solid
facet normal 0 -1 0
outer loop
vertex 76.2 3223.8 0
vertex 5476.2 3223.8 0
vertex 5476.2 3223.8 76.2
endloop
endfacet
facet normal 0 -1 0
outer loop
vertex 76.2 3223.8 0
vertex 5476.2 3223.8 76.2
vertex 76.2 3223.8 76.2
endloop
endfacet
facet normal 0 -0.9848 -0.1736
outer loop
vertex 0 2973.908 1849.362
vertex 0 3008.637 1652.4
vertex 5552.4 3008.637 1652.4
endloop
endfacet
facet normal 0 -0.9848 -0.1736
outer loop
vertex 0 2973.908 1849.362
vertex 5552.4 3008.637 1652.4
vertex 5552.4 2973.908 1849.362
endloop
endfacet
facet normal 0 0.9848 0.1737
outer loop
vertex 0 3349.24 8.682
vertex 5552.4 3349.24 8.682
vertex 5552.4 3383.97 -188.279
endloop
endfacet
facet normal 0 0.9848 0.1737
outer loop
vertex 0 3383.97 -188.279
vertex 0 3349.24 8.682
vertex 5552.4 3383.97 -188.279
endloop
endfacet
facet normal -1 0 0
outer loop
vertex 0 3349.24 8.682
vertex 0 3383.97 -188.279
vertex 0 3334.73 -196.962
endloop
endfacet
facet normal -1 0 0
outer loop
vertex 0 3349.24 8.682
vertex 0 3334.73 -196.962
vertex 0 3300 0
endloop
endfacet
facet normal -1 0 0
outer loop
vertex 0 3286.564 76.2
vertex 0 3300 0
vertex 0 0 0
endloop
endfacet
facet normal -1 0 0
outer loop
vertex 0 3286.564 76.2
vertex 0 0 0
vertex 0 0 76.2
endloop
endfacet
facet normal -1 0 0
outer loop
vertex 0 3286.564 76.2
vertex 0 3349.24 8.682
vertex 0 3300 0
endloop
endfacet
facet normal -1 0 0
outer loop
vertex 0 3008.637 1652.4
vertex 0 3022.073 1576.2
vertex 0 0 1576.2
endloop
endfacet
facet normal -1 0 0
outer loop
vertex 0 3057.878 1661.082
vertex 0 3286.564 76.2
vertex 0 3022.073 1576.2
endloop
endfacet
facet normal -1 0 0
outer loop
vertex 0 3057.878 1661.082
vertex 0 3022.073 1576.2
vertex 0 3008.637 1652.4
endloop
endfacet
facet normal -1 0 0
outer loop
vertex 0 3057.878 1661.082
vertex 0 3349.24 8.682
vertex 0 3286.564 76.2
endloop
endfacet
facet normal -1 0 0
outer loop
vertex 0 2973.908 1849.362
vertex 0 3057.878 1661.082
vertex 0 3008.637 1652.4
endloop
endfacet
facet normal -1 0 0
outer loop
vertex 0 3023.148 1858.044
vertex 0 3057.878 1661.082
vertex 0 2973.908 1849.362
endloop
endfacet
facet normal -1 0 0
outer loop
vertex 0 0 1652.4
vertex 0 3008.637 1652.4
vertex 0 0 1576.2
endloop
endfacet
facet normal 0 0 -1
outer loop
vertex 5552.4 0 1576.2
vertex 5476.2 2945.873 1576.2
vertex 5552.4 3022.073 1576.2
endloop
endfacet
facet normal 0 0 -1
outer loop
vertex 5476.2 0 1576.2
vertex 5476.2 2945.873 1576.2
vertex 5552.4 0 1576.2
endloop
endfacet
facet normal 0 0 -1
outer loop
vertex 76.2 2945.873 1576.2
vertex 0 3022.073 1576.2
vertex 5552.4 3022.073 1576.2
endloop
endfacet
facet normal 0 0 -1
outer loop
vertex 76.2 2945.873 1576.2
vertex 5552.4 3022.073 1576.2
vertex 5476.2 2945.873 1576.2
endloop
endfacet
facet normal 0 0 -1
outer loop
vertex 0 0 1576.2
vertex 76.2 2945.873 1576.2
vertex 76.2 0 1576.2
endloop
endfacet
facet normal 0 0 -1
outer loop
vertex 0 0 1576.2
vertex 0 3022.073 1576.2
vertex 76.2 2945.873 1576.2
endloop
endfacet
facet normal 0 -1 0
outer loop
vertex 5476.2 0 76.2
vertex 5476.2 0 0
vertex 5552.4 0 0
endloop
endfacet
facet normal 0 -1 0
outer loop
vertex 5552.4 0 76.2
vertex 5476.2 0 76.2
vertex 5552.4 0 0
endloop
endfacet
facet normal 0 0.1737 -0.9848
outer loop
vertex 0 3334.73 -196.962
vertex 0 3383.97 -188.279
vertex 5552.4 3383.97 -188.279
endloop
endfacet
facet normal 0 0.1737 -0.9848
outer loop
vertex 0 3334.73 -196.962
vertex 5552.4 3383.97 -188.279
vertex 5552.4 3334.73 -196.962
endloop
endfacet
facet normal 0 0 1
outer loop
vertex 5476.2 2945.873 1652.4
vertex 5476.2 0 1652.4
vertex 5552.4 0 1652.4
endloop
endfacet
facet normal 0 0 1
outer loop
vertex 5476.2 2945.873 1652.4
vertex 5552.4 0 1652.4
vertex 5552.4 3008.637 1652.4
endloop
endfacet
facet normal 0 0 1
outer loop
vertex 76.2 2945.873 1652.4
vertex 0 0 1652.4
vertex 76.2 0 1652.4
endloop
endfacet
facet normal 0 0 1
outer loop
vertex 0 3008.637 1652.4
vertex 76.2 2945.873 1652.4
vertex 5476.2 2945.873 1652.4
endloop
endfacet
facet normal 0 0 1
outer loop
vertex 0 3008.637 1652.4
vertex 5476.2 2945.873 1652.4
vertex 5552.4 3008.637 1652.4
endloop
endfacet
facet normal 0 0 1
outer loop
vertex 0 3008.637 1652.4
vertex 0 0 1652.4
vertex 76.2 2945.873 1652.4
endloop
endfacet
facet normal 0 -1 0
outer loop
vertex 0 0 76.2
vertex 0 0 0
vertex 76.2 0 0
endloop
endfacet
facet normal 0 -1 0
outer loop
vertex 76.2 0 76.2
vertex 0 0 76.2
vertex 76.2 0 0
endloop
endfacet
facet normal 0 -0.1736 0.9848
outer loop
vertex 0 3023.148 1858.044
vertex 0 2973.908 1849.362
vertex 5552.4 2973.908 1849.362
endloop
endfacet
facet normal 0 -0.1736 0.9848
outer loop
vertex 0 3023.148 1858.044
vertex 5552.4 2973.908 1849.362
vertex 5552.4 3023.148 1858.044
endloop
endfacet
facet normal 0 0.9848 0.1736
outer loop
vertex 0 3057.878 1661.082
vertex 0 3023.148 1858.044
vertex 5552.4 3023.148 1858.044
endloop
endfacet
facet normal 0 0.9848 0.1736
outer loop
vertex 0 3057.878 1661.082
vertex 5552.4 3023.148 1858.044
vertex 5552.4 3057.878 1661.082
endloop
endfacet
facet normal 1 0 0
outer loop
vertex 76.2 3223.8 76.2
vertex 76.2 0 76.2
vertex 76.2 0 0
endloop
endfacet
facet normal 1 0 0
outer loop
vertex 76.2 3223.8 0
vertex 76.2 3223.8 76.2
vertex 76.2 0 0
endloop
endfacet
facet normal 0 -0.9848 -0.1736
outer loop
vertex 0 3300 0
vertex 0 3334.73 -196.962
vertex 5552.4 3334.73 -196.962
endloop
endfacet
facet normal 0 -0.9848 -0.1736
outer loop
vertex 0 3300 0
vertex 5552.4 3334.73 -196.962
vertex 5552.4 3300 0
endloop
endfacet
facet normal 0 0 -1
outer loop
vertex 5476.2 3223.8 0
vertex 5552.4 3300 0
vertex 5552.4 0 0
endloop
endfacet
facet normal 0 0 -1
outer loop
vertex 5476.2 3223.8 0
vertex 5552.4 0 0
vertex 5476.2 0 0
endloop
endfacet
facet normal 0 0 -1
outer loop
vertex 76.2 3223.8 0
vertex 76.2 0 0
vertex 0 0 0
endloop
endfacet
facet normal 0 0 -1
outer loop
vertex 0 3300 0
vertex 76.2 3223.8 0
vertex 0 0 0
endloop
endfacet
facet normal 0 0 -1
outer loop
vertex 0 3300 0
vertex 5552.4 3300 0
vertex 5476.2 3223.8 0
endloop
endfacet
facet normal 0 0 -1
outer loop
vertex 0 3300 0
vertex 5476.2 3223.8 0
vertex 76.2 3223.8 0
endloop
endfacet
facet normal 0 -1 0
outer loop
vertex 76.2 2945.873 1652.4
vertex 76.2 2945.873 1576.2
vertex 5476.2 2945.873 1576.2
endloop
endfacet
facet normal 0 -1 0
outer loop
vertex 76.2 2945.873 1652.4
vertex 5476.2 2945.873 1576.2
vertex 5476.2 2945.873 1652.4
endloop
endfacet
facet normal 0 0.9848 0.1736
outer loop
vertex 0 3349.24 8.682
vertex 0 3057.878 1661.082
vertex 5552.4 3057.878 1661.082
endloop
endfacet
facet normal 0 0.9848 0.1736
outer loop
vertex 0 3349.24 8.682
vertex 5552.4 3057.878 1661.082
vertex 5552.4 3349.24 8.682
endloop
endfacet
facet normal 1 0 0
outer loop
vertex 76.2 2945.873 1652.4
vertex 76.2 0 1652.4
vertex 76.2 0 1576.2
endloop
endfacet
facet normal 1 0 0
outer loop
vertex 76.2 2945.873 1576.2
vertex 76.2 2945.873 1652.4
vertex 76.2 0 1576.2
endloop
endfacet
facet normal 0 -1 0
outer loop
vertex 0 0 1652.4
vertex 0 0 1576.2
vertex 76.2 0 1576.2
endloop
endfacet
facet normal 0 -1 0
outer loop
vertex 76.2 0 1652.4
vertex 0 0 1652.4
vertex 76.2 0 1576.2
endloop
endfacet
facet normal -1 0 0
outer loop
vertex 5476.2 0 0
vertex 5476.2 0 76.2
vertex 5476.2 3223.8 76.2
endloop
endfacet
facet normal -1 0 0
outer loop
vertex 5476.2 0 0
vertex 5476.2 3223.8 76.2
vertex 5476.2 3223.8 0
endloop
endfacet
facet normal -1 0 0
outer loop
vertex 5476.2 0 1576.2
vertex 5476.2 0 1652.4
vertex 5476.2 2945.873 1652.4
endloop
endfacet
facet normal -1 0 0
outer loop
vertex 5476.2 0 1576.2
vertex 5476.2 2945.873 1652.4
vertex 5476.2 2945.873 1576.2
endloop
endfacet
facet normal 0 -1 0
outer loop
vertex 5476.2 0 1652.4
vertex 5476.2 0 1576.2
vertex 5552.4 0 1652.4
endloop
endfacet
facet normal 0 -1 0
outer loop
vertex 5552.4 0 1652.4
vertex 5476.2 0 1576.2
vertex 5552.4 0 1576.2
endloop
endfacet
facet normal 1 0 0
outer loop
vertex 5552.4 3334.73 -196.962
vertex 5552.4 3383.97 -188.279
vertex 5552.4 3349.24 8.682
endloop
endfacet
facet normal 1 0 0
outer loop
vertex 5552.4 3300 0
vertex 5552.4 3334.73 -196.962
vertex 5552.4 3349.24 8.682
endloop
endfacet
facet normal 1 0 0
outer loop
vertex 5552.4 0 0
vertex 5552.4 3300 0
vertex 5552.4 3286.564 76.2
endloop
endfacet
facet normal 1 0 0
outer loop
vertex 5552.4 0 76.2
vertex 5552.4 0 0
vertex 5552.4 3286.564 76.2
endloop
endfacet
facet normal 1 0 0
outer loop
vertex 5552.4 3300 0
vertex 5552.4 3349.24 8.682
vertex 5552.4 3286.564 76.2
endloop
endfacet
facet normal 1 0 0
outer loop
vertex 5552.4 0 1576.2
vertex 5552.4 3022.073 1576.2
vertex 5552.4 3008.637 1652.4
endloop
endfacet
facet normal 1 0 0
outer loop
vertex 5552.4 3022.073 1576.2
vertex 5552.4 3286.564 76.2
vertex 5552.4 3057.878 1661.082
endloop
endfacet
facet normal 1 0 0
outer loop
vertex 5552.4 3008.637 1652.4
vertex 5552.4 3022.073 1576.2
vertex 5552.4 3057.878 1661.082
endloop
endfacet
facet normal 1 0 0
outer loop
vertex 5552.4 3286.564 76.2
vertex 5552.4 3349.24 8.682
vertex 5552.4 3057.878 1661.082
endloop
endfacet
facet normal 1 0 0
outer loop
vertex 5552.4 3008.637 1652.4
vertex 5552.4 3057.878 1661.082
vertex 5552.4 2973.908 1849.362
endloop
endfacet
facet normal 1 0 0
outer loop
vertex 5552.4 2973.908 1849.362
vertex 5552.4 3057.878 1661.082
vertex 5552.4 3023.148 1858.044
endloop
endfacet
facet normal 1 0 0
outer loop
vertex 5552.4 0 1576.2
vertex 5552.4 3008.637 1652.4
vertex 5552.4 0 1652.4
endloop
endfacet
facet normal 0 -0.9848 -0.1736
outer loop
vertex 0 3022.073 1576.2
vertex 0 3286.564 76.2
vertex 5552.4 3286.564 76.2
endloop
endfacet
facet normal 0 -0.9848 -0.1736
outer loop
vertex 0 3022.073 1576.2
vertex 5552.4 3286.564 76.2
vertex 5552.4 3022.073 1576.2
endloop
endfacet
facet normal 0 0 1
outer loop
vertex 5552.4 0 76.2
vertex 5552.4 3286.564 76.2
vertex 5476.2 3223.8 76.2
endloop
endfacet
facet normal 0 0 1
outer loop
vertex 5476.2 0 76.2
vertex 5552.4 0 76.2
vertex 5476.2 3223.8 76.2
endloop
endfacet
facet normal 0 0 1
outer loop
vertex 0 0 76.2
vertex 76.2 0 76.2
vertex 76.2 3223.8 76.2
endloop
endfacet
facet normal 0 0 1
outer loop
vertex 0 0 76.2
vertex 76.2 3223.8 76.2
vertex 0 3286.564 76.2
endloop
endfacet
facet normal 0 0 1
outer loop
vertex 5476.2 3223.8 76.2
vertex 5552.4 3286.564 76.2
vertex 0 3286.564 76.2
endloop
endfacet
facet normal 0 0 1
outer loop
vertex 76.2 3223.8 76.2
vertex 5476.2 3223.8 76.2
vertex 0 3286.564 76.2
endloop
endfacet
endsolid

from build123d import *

# Parameters (mm, degrees)
CROQUIS1_W                = 76.2
CROQUIS1_H                = 76.2
SALIENTE_EXTRUIR1_DEPTH   = 3300
SALIENTE_EXTRUIR1_2_DEPTH = 3300
SALIENTE_EXTRUIR1_3_DEPTH = 3300
SALIENTE_EXTRUIR1_4_DEPTH = 3300
CORTAR_EXTRUIR3_START     = -5552.4
CORTAR_EXTRUIR3_DEPTH     = 5552.4
SALIENTE_EXTRUIR3_DEPTH   = 5552.4
CROQUIS7_W                = 5400
CROQUIS7_H                = 76.2
SALIENTE_EXTRUIR4_DEPTH   = 76.2
SALIENTE_EXTRUIR6_DEPTH   = 5400


with BuildPart() as part:
    # Croquis1 → Saliente-Extruir1 (new body)
    with BuildSketch(Plane(origin=(0, 0, 0), x_dir=(1, 0, 0), z_dir=(0, 1, 0))):
        with Locations((38.1, -38.1)):
            Rectangle(CROQUIS1_W, CROQUIS1_H)
    extrude(amount=SALIENTE_EXTRUIR1_DEPTH)


with BuildPart() as body_2:
    # Croquis1 → Saliente-Extruir1 2 (new body)
    with BuildSketch(Plane(origin=(0, 0, 0), x_dir=(1, 0, 0), z_dir=(0, 1, 0))):
        with Locations((5514.3, -38.1)):
            Rectangle(CROQUIS1_W, CROQUIS1_H)
    extrude(amount=SALIENTE_EXTRUIR1_2_DEPTH)


with BuildPart() as body_3:
    # Croquis1 → Saliente-Extruir1 3 (new body)
    with BuildSketch(Plane(origin=(0, 0, 0), x_dir=(1, 0, 0), z_dir=(0, 1, 0))):
        with Locations((5514.3, -1614.3)):
            Rectangle(CROQUIS1_W, CROQUIS1_H)
    extrude(amount=SALIENTE_EXTRUIR1_3_DEPTH)


with BuildPart() as body_4:
    # Croquis1 → Saliente-Extruir1 4 (new body)
    with BuildSketch(Plane(origin=(0, 0, 0), x_dir=(1, 0, 0), z_dir=(0, 1, 0))):
        with Locations((38.1, -1614.3)):
            Rectangle(CROQUIS1_W, CROQUIS1_H)
    extrude(amount=SALIENTE_EXTRUIR1_4_DEPTH)


with BuildPart() as cortar_extruir3_tool:
    # Croquis5 → Cortar-Extruir3 (new body)
    with BuildSketch(Plane(origin=(5552.4, 0, 0), x_dir=(0, 0, -1), z_dir=(1, 0, 0)).offset(CORTAR_EXTRUIR3_START)):
        Polygon((0, 3300), (-2183.717463872, 2914.951692875), (-2226.424126041, 4680.194752027), (0, 4614.378523912), align=None)
    extrude(amount=CORTAR_EXTRUIR3_DEPTH)


with BuildPart() as part_1:
    add(part.part)

    # Cortar-Extruir3: cut by cortar_extruir3_tool
    add(cortar_extruir3_tool.part, mode=Mode.SUBTRACT)



with BuildPart() as body_2_1:
    add(body_2.part)

    # Cortar-Extruir3: cut by cortar_extruir3_tool
    add(cortar_extruir3_tool.part, mode=Mode.SUBTRACT)


with BuildPart() as body_3_1:
    add(body_3.part)

    # Cortar-Extruir3: cut by cortar_extruir3_tool
    add(cortar_extruir3_tool.part, mode=Mode.SUBTRACT)


with BuildPart() as body_4_1:
    add(body_4.part)

    # Cortar-Extruir3: cut by cortar_extruir3_tool
    add(cortar_extruir3_tool.part, mode=Mode.SUBTRACT)


with BuildPart() as part_2:
    add(part_1.part)

    add(body_2_1.part)  # Saliente-Extruir3 merges body 2

    add(body_3_1.part)  # Saliente-Extruir3 merges body 3

    add(body_4_1.part)  # Saliente-Extruir3 merges body 4
    # Croquis6 → Saliente-Extruir3 (add)
    with BuildSketch(Plane.ZY):
        Polygon((0, 3300), (1652.4, 3008.637297077), (1849.361550602, 2973.907661544), (1858.043959486, 3023.148049195), (1661.082408883, 3057.877684728), (8.682408883, 3349.240387651), (-188.279141719, 3383.970023184), (-196.961550602, 3334.729635533), align=None)
    extrude(amount=-SALIENTE_EXTRUIR3_DEPTH)

    # Croquis7 → Saliente-Extruir4 (add)
    with BuildSketch(Plane(origin=(0, 0, 0), x_dir=(-1, 0, 0), z_dir=(0, 0, -1))):
        with Locations((-2776.2, 3261.9)):
            Rectangle(CROQUIS7_W, CROQUIS7_H)
    extrude(amount=-SALIENTE_EXTRUIR4_DEPTH)

    # Croquis9 → Saliente-Extruir6 (add)
    with BuildSketch(Plane(origin=(76.2, 0, 0), x_dir=(0, 0, -1), z_dir=(1, 0, 0))):
        Polygon((-1576.2, 3022.073413007), (-1576.2, 2945.873413007), (-1652.4, 2945.873413007), (-1652.4, 3008.637297077), align=None)
    extrude(amount=SALIENTE_EXTRUIR6_DEPTH)


solid = part_2.part
